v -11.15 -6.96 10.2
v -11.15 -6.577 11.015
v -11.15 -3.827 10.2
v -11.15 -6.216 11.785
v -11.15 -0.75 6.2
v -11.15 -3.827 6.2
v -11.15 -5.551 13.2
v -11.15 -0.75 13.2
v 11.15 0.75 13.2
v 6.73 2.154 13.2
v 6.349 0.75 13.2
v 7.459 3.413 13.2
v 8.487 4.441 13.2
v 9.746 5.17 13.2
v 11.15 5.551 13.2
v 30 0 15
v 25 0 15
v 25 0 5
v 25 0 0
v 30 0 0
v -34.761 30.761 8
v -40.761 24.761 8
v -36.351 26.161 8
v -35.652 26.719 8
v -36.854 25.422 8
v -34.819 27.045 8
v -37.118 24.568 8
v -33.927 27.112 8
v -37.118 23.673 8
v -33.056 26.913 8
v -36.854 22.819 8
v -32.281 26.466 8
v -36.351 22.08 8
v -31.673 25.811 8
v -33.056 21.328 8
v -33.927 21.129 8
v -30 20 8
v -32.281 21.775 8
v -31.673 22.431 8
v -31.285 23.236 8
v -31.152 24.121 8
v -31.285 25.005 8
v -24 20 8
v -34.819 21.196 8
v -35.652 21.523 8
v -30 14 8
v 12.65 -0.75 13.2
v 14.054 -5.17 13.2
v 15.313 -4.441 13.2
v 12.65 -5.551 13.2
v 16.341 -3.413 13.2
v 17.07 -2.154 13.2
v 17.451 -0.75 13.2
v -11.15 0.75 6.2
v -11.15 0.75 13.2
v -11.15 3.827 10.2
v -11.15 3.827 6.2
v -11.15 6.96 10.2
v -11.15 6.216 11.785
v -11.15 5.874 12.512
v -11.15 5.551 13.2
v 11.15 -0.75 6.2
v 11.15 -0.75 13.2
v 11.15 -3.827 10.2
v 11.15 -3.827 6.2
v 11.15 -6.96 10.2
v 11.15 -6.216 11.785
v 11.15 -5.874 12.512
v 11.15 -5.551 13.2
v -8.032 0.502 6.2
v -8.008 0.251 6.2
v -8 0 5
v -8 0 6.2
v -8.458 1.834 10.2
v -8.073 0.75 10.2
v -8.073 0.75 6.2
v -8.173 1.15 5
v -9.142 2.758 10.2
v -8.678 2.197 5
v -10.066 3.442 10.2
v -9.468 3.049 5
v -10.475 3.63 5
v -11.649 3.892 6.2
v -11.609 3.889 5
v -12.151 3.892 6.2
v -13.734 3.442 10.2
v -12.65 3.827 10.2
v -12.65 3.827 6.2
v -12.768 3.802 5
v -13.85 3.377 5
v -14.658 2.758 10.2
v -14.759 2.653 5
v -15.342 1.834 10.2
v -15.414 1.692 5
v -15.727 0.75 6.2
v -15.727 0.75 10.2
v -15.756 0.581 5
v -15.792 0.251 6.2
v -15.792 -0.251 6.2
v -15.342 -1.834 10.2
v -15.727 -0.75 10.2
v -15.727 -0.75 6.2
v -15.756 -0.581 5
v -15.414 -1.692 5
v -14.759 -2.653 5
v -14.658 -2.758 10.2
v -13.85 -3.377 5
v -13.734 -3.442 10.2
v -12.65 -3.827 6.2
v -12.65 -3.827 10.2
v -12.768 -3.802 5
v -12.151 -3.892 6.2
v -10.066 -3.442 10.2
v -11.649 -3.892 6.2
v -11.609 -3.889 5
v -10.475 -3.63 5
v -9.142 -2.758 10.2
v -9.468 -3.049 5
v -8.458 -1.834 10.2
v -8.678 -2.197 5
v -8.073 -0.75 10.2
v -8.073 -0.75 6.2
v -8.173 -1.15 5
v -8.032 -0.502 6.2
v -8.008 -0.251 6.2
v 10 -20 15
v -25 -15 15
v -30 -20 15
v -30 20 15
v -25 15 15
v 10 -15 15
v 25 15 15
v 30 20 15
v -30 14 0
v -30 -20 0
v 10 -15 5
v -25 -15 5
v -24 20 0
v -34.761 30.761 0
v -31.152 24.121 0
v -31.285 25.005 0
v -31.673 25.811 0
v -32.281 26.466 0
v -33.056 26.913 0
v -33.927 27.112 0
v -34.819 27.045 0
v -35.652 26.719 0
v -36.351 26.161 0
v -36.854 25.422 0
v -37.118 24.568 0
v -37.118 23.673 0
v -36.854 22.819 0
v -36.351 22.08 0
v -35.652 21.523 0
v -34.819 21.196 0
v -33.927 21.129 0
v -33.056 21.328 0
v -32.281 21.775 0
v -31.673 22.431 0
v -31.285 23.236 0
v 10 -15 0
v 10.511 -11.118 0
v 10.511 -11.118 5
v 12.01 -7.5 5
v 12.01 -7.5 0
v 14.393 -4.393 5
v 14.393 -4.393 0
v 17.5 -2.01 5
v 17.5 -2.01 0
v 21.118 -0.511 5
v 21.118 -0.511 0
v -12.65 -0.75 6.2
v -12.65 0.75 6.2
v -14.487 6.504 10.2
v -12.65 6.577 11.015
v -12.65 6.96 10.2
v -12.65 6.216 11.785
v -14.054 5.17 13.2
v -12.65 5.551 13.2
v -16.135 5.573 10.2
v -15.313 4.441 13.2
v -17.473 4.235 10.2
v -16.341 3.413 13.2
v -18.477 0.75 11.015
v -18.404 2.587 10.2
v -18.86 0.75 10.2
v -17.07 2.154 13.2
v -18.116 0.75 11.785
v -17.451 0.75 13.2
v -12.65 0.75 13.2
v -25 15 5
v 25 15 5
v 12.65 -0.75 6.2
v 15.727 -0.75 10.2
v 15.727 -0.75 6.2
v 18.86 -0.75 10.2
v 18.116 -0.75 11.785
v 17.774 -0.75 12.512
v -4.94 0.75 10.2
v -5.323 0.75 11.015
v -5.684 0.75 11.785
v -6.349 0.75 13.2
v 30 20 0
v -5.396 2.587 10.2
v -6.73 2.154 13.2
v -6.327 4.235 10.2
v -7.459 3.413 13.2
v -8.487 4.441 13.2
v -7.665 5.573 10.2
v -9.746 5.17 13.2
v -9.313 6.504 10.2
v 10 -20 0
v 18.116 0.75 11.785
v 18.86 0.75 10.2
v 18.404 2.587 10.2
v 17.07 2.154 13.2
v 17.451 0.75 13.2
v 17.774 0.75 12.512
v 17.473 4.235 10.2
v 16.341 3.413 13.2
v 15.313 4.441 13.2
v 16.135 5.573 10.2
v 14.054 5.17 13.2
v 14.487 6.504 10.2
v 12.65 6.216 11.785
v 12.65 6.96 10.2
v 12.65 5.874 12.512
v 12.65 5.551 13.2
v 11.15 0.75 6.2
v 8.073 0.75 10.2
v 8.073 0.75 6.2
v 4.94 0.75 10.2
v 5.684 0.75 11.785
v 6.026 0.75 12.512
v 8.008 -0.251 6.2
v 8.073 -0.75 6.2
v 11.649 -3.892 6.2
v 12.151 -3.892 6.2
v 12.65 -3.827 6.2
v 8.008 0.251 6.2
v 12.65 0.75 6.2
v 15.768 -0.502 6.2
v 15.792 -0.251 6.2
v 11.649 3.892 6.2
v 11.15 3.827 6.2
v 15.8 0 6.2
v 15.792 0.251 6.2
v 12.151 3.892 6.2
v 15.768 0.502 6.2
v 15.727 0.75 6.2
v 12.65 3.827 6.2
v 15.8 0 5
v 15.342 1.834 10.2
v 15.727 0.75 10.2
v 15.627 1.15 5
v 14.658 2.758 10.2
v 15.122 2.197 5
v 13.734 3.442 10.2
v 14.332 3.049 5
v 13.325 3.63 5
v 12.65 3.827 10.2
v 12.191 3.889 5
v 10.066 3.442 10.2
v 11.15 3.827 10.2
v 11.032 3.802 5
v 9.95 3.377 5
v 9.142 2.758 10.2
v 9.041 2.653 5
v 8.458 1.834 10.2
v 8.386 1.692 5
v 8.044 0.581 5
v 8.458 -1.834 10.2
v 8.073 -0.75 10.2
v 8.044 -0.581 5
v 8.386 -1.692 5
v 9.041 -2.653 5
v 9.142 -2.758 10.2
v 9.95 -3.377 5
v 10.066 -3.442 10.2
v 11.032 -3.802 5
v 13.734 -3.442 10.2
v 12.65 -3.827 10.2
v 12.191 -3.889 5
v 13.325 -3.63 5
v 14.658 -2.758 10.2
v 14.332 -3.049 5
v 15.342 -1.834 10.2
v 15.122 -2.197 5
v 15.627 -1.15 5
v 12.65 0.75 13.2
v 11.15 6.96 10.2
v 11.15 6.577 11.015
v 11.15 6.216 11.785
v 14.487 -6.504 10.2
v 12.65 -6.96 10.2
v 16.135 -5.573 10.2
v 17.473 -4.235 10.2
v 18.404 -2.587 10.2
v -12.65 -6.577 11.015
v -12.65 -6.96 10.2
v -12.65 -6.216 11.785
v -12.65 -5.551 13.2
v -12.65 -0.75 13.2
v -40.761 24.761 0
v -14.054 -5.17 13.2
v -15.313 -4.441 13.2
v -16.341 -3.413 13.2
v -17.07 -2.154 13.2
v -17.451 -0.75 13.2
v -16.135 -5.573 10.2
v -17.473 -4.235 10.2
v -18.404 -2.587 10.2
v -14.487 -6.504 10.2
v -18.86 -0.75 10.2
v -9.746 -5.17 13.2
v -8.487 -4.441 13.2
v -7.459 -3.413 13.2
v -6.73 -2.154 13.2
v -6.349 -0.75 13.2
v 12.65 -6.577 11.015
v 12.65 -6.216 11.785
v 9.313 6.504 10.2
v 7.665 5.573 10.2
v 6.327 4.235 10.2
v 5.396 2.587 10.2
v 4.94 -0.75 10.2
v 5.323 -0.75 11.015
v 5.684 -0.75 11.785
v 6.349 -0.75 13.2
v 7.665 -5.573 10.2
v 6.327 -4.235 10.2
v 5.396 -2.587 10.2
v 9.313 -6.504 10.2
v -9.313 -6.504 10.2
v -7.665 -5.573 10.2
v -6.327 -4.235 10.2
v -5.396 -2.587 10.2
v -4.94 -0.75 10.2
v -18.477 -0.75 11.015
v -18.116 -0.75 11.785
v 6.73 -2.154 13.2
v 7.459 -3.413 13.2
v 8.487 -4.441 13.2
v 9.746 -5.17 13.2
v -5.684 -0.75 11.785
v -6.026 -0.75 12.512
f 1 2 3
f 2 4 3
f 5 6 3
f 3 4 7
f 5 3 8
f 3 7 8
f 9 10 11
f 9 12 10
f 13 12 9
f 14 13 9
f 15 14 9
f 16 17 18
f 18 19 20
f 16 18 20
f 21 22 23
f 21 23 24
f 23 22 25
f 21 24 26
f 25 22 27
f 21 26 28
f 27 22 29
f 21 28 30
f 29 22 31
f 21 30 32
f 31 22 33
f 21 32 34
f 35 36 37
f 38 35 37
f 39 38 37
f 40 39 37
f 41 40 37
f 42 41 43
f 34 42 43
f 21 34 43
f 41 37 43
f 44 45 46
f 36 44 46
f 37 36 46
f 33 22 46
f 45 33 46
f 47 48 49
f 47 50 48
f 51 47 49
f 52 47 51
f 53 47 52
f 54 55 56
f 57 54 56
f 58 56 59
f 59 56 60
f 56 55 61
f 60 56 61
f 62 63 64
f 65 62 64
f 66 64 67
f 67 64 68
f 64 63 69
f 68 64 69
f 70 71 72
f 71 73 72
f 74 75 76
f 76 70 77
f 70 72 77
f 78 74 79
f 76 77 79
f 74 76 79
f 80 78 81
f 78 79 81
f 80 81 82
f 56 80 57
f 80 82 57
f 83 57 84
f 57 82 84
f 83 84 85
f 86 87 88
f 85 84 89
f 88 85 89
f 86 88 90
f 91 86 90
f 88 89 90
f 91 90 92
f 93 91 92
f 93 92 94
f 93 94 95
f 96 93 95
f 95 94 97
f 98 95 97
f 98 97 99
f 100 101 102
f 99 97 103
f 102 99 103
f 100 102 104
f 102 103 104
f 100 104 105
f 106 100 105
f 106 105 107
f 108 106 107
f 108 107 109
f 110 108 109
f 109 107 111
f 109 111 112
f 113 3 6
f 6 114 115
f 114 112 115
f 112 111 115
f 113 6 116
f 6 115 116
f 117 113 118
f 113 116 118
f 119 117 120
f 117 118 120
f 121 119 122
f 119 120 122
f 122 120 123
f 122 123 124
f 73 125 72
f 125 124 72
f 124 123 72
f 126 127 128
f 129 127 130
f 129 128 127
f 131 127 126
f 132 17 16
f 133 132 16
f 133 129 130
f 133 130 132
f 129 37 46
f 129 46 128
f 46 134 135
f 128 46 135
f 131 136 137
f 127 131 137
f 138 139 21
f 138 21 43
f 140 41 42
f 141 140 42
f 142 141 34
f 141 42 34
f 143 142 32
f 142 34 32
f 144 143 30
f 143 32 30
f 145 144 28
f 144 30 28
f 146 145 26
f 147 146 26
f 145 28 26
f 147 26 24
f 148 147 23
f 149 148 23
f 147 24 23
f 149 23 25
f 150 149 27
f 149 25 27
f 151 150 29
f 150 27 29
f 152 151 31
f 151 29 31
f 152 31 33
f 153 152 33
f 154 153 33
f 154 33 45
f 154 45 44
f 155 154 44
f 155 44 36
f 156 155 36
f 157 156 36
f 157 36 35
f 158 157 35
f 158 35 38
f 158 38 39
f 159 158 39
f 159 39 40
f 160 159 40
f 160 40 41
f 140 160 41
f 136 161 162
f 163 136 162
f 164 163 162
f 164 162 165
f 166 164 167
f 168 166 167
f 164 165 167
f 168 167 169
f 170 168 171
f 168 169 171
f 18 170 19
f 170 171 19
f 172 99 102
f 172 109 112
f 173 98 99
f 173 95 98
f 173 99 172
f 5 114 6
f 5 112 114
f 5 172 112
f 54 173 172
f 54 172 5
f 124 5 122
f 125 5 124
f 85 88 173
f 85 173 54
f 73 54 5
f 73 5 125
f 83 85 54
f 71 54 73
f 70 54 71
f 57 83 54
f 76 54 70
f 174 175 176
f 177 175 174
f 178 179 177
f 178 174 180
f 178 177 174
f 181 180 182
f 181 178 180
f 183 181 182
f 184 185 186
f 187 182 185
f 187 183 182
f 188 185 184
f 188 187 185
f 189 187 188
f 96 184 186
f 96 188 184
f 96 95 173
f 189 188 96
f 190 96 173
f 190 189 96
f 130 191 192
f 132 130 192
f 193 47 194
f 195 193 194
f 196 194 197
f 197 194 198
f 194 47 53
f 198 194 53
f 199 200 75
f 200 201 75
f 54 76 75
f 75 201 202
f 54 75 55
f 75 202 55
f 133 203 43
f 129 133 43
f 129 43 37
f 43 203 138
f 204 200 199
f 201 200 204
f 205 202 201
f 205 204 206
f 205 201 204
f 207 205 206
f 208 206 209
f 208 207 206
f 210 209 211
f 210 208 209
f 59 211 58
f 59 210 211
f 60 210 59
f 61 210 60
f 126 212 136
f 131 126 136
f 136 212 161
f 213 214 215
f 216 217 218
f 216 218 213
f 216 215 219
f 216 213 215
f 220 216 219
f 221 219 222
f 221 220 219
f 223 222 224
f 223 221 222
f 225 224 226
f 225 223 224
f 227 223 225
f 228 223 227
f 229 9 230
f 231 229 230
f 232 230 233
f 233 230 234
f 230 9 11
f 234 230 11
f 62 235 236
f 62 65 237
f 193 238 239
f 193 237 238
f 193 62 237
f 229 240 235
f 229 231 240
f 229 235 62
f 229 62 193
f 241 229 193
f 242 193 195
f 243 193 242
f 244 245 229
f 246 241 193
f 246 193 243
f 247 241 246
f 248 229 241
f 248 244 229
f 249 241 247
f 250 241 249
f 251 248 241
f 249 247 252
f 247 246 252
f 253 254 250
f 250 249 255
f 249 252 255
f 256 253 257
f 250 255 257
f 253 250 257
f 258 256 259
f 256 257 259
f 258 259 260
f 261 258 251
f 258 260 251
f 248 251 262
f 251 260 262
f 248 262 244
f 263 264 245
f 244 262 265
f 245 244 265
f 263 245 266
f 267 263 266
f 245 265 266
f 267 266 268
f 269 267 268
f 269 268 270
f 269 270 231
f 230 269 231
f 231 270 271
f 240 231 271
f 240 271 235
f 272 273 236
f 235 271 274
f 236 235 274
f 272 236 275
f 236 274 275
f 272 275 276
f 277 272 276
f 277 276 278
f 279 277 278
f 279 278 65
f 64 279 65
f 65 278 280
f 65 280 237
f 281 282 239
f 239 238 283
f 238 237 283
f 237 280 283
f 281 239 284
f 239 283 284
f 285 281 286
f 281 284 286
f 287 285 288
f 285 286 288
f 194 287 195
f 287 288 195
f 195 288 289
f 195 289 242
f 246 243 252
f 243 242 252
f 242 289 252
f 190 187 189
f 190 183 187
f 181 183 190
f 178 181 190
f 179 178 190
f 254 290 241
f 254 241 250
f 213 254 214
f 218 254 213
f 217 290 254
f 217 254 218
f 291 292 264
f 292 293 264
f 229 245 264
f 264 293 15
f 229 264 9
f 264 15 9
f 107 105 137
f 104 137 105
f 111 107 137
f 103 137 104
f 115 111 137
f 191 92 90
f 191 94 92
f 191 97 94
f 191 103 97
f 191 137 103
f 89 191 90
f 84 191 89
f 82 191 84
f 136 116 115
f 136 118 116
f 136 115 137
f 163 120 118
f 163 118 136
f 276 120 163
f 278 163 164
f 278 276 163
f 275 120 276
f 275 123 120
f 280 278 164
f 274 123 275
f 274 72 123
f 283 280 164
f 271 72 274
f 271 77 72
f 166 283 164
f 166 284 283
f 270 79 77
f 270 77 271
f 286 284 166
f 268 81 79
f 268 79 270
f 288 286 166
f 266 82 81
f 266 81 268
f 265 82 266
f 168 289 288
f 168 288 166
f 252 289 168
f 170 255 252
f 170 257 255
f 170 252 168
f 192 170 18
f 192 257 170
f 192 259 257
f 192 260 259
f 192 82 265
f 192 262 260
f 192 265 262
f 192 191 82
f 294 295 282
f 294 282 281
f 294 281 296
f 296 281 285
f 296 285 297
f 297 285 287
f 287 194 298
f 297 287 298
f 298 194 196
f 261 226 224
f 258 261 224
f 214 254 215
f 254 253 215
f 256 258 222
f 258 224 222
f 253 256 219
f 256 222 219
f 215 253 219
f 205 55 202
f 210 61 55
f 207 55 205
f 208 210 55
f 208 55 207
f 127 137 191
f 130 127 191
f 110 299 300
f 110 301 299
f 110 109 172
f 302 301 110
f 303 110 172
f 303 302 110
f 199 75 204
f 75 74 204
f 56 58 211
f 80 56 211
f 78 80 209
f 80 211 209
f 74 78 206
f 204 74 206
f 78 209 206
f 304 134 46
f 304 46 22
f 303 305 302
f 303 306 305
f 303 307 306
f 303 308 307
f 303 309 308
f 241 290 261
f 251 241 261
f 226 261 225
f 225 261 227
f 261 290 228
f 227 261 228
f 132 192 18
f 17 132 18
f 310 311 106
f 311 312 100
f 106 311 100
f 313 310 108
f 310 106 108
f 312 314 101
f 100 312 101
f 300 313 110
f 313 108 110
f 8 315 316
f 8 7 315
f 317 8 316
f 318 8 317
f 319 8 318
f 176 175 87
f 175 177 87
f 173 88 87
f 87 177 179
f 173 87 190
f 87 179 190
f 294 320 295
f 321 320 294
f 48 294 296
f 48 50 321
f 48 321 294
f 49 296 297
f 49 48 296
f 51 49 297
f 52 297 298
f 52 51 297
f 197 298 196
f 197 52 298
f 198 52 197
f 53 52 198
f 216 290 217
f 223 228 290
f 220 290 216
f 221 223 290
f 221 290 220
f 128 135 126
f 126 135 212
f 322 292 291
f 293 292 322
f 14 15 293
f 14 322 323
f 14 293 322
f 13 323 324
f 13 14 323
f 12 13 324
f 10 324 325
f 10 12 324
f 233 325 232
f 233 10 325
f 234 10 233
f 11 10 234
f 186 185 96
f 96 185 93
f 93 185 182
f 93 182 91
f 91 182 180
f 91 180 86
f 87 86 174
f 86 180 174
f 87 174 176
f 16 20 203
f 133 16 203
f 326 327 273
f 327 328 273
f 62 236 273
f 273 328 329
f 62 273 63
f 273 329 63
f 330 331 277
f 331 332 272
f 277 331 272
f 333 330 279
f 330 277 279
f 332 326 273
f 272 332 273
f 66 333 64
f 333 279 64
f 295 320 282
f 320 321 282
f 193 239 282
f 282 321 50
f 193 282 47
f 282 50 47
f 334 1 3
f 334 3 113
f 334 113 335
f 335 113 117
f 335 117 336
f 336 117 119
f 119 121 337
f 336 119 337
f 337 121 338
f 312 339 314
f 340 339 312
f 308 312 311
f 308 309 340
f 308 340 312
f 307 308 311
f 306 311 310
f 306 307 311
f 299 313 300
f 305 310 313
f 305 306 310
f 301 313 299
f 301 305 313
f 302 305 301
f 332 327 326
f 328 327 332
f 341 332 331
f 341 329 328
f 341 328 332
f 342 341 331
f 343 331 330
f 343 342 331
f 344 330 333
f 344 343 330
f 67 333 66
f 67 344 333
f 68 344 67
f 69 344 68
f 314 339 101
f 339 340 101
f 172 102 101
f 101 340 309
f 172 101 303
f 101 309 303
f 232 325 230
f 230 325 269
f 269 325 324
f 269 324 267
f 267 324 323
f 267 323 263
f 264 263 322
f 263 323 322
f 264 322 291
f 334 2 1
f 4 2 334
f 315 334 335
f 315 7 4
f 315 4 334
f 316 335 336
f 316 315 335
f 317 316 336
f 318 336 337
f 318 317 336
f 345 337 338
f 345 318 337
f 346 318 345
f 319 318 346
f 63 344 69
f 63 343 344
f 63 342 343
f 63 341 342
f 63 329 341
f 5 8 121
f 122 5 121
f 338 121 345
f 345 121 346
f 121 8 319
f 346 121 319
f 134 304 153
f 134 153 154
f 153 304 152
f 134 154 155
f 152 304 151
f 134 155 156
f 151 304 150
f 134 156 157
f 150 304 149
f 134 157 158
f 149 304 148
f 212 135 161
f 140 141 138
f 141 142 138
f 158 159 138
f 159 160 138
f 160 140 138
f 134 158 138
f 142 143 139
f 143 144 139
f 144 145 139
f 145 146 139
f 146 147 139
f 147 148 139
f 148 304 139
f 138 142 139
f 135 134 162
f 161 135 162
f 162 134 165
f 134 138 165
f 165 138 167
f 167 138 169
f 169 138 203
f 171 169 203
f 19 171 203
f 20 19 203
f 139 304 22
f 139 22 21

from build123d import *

# Parameters (mm, degrees)
F0_W      = 60
F0_H      = 40
F1_DEPTH  = 5
F2_W      = 5
F2_H      = 30
F3_DEPTH  = 10
F5_DEPTH  = 25
F6_R      = 3.9
F7_DEPTH  = 5.2
F8_R      = 7
F9_DEPTH  = 3
F9_TAPER  = 25
F10_W     = 1.5
F10_H     = 1.5
F10_W_2   = 7.1590355843
F10_H_2   = 7.6815277636
F11_DEPTH = 7
F12_DEPTH = 7
F14_DEPTH = 8
F15_R     = 3
F16_DEPTH = 25


with BuildPart() as f1:
    # F0 (on Top) → F1 (new body)
    with BuildSketch(Plane.XY):
        Rectangle(F0_W, F0_H)
    extrude(amount=F1_DEPTH)

    # F2 (on face) → F3 (join)
    with BuildSketch(Plane.XY.offset(5)):
        Polygon((30, 20), (-30, 20), (-30, 15), (-25, 15), (25, 15), (30, 15), align=None)
        with Locations((-27.5, 0)):
            Rectangle(F2_W, F2_H)
        Polygon((30, -20), (30, 15), (25, 15), (25, -15), (25, -20), align=None)
        Polygon((-25, -15), (-30, -15), (-30, -20), (25, -20), (25, -15), align=None)
    extrude(amount=F3_DEPTH)

    # F4 (on face) → F5 (cut)
    with BuildSketch(Plane(origin=(0, 0, 0), x_dir=(1, 0, 0), z_dir=(0, 0, -1))):
        with BuildLine():
            Line((25, 0), (30, 0))
            Line((30, 0), (30, 20))
            Line((30, 20), (10, 20))
            Line((10, 20), (10, 15))
            ThreePointArc((10, 15), (14.3933982822, 4.3933982822), (25, 0))
        make_face()
    extrude(amount=-F5_DEPTH, mode=Mode.SUBTRACT)

    # F6 (on face) → F7 (join)
    with BuildSketch(Plane.XY.offset(5)):
        with Locations((11.9, 0)):
            Circle(F6_R)
        with Locations((-11.9, 0)):
            Circle(F6_R)
    extrude(amount=F7_DEPTH)

    # F8 (on face) → F9 (join)
    with BuildSketch(Plane.XY.offset(10.2)):
        with Locations((-11.9, 0)):
            Circle(F8_R)
        with Locations((11.9, 0)):
            Circle(F8_R)
    extrude(amount=F9_DEPTH, taper=F9_TAPER)

    # F10 (on face) → F11 (cut)
    with BuildSketch(Plane.XY.offset(13.2)):
        Polygon((-11.15, 7.5554959476), (-11.9, 7.5554959476), (-12.65, 7.5554959476), (-12.65, 0.75), (-11.15, 0.75), align=None)
        Polygon((-2.854565857, 0.75), (-11.15, 0.75), (-11.15, -0.75), (-2.854565857, -0.75), (-2.854565857, 0), align=None)
        with Locations((-11.9, 0)):
            Rectangle(F10_W, F10_H)
        with Locations((-16.2295177922, 0)):
            Rectangle(F10_W_2, F10_H)
        with Locations((-11.9, -4.5907638818)):
            Rectangle(F10_W, F10_H_2)
        Polygon((12.65, 0.75), (12.65, 7.5554959476), (11.9, 7.5554959476), (11.15, 7.5554959476), (11.15, 0.75), align=None)
        with Locations((16.2295177922, 0)):
            Rectangle(F10_W_2, F10_H)
        with Locations((11.9, 0)):
            Rectangle(F10_W, F10_H)
        with Locations((11.9, -4.5907638818)):
            Rectangle(F10_W, F10_H_2)
        Polygon((11.15, -0.75), (11.15, 0.75), (2.854565857, 0.75), (2.854565857, 0), (2.854565857, -0.75), align=None)
    extrude(amount=-F11_DEPTH, mode=Mode.SUBTRACT)

    # F10 (on face) → F12 (cut)
    with BuildSketch(Plane.XY.offset(13.2)):
        Polygon((-11.15, 7.5554959476), (-11.9, 7.5554959476), (-12.65, 7.5554959476), (-12.65, 0.75), (-11.15, 0.75), align=None)
        Polygon((-2.854565857, 0.75), (-11.15, 0.75), (-11.15, -0.75), (-2.854565857, -0.75), (-2.854565857, 0), align=None)
        with Locations((-11.9, 0)):
            Rectangle(F10_W, F10_H)
        with Locations((-16.2295177922, 0)):
            Rectangle(F10_W_2, F10_H)
        with Locations((-11.9, -4.5907638818)):
            Rectangle(F10_W, F10_H_2)
        Polygon((12.65, 0.75), (12.65, 7.5554959476), (11.9, 7.5554959476), (11.15, 7.5554959476), (11.15, 0.75), align=None)
        with Locations((16.2295177922, 0)):
            Rectangle(F10_W_2, F10_H)
        with Locations((11.9, 0)):
            Rectangle(F10_W, F10_H)
        with Locations((11.9, -4.5907638818)):
            Rectangle(F10_W, F10_H_2)
        Polygon((11.15, -0.75), (11.15, 0.75), (2.854565857, 0.75), (2.854565857, 0), (2.854565857, -0.75), align=None)
    extrude(amount=-F12_DEPTH, mode=Mode.SUBTRACT)

    # F13 (on face) → F14 (join)
    with BuildSketch(Plane(origin=(0, 0, 0), x_dir=(1, 0, 0), z_dir=(0, 0, -1))):
        Polygon((-23.4916425814, -19.4916425814), (-29.4916425814, -13.4916425814), (-37.225079692, -21.225079692), (-31.225079692, -27.225079692), align=None)
        Polygon((-31.225079692, -27.225079692), (-37.225079692, -21.225079692), (-40.7606135979, -24.7606135979), (-34.7606135979, -30.7606135979), align=None)
    extrude(amount=-F14_DEPTH)

    # F15 (on face) → F16 (cut)
    with BuildSketch(Plane.XY.offset(8)):
        with Locations((-34.1515289412, 24.1206135979)):
            Circle(F15_R)
    extrude(amount=-F16_DEPTH, mode=Mode.SUBTRACT)


solid = f1.part
